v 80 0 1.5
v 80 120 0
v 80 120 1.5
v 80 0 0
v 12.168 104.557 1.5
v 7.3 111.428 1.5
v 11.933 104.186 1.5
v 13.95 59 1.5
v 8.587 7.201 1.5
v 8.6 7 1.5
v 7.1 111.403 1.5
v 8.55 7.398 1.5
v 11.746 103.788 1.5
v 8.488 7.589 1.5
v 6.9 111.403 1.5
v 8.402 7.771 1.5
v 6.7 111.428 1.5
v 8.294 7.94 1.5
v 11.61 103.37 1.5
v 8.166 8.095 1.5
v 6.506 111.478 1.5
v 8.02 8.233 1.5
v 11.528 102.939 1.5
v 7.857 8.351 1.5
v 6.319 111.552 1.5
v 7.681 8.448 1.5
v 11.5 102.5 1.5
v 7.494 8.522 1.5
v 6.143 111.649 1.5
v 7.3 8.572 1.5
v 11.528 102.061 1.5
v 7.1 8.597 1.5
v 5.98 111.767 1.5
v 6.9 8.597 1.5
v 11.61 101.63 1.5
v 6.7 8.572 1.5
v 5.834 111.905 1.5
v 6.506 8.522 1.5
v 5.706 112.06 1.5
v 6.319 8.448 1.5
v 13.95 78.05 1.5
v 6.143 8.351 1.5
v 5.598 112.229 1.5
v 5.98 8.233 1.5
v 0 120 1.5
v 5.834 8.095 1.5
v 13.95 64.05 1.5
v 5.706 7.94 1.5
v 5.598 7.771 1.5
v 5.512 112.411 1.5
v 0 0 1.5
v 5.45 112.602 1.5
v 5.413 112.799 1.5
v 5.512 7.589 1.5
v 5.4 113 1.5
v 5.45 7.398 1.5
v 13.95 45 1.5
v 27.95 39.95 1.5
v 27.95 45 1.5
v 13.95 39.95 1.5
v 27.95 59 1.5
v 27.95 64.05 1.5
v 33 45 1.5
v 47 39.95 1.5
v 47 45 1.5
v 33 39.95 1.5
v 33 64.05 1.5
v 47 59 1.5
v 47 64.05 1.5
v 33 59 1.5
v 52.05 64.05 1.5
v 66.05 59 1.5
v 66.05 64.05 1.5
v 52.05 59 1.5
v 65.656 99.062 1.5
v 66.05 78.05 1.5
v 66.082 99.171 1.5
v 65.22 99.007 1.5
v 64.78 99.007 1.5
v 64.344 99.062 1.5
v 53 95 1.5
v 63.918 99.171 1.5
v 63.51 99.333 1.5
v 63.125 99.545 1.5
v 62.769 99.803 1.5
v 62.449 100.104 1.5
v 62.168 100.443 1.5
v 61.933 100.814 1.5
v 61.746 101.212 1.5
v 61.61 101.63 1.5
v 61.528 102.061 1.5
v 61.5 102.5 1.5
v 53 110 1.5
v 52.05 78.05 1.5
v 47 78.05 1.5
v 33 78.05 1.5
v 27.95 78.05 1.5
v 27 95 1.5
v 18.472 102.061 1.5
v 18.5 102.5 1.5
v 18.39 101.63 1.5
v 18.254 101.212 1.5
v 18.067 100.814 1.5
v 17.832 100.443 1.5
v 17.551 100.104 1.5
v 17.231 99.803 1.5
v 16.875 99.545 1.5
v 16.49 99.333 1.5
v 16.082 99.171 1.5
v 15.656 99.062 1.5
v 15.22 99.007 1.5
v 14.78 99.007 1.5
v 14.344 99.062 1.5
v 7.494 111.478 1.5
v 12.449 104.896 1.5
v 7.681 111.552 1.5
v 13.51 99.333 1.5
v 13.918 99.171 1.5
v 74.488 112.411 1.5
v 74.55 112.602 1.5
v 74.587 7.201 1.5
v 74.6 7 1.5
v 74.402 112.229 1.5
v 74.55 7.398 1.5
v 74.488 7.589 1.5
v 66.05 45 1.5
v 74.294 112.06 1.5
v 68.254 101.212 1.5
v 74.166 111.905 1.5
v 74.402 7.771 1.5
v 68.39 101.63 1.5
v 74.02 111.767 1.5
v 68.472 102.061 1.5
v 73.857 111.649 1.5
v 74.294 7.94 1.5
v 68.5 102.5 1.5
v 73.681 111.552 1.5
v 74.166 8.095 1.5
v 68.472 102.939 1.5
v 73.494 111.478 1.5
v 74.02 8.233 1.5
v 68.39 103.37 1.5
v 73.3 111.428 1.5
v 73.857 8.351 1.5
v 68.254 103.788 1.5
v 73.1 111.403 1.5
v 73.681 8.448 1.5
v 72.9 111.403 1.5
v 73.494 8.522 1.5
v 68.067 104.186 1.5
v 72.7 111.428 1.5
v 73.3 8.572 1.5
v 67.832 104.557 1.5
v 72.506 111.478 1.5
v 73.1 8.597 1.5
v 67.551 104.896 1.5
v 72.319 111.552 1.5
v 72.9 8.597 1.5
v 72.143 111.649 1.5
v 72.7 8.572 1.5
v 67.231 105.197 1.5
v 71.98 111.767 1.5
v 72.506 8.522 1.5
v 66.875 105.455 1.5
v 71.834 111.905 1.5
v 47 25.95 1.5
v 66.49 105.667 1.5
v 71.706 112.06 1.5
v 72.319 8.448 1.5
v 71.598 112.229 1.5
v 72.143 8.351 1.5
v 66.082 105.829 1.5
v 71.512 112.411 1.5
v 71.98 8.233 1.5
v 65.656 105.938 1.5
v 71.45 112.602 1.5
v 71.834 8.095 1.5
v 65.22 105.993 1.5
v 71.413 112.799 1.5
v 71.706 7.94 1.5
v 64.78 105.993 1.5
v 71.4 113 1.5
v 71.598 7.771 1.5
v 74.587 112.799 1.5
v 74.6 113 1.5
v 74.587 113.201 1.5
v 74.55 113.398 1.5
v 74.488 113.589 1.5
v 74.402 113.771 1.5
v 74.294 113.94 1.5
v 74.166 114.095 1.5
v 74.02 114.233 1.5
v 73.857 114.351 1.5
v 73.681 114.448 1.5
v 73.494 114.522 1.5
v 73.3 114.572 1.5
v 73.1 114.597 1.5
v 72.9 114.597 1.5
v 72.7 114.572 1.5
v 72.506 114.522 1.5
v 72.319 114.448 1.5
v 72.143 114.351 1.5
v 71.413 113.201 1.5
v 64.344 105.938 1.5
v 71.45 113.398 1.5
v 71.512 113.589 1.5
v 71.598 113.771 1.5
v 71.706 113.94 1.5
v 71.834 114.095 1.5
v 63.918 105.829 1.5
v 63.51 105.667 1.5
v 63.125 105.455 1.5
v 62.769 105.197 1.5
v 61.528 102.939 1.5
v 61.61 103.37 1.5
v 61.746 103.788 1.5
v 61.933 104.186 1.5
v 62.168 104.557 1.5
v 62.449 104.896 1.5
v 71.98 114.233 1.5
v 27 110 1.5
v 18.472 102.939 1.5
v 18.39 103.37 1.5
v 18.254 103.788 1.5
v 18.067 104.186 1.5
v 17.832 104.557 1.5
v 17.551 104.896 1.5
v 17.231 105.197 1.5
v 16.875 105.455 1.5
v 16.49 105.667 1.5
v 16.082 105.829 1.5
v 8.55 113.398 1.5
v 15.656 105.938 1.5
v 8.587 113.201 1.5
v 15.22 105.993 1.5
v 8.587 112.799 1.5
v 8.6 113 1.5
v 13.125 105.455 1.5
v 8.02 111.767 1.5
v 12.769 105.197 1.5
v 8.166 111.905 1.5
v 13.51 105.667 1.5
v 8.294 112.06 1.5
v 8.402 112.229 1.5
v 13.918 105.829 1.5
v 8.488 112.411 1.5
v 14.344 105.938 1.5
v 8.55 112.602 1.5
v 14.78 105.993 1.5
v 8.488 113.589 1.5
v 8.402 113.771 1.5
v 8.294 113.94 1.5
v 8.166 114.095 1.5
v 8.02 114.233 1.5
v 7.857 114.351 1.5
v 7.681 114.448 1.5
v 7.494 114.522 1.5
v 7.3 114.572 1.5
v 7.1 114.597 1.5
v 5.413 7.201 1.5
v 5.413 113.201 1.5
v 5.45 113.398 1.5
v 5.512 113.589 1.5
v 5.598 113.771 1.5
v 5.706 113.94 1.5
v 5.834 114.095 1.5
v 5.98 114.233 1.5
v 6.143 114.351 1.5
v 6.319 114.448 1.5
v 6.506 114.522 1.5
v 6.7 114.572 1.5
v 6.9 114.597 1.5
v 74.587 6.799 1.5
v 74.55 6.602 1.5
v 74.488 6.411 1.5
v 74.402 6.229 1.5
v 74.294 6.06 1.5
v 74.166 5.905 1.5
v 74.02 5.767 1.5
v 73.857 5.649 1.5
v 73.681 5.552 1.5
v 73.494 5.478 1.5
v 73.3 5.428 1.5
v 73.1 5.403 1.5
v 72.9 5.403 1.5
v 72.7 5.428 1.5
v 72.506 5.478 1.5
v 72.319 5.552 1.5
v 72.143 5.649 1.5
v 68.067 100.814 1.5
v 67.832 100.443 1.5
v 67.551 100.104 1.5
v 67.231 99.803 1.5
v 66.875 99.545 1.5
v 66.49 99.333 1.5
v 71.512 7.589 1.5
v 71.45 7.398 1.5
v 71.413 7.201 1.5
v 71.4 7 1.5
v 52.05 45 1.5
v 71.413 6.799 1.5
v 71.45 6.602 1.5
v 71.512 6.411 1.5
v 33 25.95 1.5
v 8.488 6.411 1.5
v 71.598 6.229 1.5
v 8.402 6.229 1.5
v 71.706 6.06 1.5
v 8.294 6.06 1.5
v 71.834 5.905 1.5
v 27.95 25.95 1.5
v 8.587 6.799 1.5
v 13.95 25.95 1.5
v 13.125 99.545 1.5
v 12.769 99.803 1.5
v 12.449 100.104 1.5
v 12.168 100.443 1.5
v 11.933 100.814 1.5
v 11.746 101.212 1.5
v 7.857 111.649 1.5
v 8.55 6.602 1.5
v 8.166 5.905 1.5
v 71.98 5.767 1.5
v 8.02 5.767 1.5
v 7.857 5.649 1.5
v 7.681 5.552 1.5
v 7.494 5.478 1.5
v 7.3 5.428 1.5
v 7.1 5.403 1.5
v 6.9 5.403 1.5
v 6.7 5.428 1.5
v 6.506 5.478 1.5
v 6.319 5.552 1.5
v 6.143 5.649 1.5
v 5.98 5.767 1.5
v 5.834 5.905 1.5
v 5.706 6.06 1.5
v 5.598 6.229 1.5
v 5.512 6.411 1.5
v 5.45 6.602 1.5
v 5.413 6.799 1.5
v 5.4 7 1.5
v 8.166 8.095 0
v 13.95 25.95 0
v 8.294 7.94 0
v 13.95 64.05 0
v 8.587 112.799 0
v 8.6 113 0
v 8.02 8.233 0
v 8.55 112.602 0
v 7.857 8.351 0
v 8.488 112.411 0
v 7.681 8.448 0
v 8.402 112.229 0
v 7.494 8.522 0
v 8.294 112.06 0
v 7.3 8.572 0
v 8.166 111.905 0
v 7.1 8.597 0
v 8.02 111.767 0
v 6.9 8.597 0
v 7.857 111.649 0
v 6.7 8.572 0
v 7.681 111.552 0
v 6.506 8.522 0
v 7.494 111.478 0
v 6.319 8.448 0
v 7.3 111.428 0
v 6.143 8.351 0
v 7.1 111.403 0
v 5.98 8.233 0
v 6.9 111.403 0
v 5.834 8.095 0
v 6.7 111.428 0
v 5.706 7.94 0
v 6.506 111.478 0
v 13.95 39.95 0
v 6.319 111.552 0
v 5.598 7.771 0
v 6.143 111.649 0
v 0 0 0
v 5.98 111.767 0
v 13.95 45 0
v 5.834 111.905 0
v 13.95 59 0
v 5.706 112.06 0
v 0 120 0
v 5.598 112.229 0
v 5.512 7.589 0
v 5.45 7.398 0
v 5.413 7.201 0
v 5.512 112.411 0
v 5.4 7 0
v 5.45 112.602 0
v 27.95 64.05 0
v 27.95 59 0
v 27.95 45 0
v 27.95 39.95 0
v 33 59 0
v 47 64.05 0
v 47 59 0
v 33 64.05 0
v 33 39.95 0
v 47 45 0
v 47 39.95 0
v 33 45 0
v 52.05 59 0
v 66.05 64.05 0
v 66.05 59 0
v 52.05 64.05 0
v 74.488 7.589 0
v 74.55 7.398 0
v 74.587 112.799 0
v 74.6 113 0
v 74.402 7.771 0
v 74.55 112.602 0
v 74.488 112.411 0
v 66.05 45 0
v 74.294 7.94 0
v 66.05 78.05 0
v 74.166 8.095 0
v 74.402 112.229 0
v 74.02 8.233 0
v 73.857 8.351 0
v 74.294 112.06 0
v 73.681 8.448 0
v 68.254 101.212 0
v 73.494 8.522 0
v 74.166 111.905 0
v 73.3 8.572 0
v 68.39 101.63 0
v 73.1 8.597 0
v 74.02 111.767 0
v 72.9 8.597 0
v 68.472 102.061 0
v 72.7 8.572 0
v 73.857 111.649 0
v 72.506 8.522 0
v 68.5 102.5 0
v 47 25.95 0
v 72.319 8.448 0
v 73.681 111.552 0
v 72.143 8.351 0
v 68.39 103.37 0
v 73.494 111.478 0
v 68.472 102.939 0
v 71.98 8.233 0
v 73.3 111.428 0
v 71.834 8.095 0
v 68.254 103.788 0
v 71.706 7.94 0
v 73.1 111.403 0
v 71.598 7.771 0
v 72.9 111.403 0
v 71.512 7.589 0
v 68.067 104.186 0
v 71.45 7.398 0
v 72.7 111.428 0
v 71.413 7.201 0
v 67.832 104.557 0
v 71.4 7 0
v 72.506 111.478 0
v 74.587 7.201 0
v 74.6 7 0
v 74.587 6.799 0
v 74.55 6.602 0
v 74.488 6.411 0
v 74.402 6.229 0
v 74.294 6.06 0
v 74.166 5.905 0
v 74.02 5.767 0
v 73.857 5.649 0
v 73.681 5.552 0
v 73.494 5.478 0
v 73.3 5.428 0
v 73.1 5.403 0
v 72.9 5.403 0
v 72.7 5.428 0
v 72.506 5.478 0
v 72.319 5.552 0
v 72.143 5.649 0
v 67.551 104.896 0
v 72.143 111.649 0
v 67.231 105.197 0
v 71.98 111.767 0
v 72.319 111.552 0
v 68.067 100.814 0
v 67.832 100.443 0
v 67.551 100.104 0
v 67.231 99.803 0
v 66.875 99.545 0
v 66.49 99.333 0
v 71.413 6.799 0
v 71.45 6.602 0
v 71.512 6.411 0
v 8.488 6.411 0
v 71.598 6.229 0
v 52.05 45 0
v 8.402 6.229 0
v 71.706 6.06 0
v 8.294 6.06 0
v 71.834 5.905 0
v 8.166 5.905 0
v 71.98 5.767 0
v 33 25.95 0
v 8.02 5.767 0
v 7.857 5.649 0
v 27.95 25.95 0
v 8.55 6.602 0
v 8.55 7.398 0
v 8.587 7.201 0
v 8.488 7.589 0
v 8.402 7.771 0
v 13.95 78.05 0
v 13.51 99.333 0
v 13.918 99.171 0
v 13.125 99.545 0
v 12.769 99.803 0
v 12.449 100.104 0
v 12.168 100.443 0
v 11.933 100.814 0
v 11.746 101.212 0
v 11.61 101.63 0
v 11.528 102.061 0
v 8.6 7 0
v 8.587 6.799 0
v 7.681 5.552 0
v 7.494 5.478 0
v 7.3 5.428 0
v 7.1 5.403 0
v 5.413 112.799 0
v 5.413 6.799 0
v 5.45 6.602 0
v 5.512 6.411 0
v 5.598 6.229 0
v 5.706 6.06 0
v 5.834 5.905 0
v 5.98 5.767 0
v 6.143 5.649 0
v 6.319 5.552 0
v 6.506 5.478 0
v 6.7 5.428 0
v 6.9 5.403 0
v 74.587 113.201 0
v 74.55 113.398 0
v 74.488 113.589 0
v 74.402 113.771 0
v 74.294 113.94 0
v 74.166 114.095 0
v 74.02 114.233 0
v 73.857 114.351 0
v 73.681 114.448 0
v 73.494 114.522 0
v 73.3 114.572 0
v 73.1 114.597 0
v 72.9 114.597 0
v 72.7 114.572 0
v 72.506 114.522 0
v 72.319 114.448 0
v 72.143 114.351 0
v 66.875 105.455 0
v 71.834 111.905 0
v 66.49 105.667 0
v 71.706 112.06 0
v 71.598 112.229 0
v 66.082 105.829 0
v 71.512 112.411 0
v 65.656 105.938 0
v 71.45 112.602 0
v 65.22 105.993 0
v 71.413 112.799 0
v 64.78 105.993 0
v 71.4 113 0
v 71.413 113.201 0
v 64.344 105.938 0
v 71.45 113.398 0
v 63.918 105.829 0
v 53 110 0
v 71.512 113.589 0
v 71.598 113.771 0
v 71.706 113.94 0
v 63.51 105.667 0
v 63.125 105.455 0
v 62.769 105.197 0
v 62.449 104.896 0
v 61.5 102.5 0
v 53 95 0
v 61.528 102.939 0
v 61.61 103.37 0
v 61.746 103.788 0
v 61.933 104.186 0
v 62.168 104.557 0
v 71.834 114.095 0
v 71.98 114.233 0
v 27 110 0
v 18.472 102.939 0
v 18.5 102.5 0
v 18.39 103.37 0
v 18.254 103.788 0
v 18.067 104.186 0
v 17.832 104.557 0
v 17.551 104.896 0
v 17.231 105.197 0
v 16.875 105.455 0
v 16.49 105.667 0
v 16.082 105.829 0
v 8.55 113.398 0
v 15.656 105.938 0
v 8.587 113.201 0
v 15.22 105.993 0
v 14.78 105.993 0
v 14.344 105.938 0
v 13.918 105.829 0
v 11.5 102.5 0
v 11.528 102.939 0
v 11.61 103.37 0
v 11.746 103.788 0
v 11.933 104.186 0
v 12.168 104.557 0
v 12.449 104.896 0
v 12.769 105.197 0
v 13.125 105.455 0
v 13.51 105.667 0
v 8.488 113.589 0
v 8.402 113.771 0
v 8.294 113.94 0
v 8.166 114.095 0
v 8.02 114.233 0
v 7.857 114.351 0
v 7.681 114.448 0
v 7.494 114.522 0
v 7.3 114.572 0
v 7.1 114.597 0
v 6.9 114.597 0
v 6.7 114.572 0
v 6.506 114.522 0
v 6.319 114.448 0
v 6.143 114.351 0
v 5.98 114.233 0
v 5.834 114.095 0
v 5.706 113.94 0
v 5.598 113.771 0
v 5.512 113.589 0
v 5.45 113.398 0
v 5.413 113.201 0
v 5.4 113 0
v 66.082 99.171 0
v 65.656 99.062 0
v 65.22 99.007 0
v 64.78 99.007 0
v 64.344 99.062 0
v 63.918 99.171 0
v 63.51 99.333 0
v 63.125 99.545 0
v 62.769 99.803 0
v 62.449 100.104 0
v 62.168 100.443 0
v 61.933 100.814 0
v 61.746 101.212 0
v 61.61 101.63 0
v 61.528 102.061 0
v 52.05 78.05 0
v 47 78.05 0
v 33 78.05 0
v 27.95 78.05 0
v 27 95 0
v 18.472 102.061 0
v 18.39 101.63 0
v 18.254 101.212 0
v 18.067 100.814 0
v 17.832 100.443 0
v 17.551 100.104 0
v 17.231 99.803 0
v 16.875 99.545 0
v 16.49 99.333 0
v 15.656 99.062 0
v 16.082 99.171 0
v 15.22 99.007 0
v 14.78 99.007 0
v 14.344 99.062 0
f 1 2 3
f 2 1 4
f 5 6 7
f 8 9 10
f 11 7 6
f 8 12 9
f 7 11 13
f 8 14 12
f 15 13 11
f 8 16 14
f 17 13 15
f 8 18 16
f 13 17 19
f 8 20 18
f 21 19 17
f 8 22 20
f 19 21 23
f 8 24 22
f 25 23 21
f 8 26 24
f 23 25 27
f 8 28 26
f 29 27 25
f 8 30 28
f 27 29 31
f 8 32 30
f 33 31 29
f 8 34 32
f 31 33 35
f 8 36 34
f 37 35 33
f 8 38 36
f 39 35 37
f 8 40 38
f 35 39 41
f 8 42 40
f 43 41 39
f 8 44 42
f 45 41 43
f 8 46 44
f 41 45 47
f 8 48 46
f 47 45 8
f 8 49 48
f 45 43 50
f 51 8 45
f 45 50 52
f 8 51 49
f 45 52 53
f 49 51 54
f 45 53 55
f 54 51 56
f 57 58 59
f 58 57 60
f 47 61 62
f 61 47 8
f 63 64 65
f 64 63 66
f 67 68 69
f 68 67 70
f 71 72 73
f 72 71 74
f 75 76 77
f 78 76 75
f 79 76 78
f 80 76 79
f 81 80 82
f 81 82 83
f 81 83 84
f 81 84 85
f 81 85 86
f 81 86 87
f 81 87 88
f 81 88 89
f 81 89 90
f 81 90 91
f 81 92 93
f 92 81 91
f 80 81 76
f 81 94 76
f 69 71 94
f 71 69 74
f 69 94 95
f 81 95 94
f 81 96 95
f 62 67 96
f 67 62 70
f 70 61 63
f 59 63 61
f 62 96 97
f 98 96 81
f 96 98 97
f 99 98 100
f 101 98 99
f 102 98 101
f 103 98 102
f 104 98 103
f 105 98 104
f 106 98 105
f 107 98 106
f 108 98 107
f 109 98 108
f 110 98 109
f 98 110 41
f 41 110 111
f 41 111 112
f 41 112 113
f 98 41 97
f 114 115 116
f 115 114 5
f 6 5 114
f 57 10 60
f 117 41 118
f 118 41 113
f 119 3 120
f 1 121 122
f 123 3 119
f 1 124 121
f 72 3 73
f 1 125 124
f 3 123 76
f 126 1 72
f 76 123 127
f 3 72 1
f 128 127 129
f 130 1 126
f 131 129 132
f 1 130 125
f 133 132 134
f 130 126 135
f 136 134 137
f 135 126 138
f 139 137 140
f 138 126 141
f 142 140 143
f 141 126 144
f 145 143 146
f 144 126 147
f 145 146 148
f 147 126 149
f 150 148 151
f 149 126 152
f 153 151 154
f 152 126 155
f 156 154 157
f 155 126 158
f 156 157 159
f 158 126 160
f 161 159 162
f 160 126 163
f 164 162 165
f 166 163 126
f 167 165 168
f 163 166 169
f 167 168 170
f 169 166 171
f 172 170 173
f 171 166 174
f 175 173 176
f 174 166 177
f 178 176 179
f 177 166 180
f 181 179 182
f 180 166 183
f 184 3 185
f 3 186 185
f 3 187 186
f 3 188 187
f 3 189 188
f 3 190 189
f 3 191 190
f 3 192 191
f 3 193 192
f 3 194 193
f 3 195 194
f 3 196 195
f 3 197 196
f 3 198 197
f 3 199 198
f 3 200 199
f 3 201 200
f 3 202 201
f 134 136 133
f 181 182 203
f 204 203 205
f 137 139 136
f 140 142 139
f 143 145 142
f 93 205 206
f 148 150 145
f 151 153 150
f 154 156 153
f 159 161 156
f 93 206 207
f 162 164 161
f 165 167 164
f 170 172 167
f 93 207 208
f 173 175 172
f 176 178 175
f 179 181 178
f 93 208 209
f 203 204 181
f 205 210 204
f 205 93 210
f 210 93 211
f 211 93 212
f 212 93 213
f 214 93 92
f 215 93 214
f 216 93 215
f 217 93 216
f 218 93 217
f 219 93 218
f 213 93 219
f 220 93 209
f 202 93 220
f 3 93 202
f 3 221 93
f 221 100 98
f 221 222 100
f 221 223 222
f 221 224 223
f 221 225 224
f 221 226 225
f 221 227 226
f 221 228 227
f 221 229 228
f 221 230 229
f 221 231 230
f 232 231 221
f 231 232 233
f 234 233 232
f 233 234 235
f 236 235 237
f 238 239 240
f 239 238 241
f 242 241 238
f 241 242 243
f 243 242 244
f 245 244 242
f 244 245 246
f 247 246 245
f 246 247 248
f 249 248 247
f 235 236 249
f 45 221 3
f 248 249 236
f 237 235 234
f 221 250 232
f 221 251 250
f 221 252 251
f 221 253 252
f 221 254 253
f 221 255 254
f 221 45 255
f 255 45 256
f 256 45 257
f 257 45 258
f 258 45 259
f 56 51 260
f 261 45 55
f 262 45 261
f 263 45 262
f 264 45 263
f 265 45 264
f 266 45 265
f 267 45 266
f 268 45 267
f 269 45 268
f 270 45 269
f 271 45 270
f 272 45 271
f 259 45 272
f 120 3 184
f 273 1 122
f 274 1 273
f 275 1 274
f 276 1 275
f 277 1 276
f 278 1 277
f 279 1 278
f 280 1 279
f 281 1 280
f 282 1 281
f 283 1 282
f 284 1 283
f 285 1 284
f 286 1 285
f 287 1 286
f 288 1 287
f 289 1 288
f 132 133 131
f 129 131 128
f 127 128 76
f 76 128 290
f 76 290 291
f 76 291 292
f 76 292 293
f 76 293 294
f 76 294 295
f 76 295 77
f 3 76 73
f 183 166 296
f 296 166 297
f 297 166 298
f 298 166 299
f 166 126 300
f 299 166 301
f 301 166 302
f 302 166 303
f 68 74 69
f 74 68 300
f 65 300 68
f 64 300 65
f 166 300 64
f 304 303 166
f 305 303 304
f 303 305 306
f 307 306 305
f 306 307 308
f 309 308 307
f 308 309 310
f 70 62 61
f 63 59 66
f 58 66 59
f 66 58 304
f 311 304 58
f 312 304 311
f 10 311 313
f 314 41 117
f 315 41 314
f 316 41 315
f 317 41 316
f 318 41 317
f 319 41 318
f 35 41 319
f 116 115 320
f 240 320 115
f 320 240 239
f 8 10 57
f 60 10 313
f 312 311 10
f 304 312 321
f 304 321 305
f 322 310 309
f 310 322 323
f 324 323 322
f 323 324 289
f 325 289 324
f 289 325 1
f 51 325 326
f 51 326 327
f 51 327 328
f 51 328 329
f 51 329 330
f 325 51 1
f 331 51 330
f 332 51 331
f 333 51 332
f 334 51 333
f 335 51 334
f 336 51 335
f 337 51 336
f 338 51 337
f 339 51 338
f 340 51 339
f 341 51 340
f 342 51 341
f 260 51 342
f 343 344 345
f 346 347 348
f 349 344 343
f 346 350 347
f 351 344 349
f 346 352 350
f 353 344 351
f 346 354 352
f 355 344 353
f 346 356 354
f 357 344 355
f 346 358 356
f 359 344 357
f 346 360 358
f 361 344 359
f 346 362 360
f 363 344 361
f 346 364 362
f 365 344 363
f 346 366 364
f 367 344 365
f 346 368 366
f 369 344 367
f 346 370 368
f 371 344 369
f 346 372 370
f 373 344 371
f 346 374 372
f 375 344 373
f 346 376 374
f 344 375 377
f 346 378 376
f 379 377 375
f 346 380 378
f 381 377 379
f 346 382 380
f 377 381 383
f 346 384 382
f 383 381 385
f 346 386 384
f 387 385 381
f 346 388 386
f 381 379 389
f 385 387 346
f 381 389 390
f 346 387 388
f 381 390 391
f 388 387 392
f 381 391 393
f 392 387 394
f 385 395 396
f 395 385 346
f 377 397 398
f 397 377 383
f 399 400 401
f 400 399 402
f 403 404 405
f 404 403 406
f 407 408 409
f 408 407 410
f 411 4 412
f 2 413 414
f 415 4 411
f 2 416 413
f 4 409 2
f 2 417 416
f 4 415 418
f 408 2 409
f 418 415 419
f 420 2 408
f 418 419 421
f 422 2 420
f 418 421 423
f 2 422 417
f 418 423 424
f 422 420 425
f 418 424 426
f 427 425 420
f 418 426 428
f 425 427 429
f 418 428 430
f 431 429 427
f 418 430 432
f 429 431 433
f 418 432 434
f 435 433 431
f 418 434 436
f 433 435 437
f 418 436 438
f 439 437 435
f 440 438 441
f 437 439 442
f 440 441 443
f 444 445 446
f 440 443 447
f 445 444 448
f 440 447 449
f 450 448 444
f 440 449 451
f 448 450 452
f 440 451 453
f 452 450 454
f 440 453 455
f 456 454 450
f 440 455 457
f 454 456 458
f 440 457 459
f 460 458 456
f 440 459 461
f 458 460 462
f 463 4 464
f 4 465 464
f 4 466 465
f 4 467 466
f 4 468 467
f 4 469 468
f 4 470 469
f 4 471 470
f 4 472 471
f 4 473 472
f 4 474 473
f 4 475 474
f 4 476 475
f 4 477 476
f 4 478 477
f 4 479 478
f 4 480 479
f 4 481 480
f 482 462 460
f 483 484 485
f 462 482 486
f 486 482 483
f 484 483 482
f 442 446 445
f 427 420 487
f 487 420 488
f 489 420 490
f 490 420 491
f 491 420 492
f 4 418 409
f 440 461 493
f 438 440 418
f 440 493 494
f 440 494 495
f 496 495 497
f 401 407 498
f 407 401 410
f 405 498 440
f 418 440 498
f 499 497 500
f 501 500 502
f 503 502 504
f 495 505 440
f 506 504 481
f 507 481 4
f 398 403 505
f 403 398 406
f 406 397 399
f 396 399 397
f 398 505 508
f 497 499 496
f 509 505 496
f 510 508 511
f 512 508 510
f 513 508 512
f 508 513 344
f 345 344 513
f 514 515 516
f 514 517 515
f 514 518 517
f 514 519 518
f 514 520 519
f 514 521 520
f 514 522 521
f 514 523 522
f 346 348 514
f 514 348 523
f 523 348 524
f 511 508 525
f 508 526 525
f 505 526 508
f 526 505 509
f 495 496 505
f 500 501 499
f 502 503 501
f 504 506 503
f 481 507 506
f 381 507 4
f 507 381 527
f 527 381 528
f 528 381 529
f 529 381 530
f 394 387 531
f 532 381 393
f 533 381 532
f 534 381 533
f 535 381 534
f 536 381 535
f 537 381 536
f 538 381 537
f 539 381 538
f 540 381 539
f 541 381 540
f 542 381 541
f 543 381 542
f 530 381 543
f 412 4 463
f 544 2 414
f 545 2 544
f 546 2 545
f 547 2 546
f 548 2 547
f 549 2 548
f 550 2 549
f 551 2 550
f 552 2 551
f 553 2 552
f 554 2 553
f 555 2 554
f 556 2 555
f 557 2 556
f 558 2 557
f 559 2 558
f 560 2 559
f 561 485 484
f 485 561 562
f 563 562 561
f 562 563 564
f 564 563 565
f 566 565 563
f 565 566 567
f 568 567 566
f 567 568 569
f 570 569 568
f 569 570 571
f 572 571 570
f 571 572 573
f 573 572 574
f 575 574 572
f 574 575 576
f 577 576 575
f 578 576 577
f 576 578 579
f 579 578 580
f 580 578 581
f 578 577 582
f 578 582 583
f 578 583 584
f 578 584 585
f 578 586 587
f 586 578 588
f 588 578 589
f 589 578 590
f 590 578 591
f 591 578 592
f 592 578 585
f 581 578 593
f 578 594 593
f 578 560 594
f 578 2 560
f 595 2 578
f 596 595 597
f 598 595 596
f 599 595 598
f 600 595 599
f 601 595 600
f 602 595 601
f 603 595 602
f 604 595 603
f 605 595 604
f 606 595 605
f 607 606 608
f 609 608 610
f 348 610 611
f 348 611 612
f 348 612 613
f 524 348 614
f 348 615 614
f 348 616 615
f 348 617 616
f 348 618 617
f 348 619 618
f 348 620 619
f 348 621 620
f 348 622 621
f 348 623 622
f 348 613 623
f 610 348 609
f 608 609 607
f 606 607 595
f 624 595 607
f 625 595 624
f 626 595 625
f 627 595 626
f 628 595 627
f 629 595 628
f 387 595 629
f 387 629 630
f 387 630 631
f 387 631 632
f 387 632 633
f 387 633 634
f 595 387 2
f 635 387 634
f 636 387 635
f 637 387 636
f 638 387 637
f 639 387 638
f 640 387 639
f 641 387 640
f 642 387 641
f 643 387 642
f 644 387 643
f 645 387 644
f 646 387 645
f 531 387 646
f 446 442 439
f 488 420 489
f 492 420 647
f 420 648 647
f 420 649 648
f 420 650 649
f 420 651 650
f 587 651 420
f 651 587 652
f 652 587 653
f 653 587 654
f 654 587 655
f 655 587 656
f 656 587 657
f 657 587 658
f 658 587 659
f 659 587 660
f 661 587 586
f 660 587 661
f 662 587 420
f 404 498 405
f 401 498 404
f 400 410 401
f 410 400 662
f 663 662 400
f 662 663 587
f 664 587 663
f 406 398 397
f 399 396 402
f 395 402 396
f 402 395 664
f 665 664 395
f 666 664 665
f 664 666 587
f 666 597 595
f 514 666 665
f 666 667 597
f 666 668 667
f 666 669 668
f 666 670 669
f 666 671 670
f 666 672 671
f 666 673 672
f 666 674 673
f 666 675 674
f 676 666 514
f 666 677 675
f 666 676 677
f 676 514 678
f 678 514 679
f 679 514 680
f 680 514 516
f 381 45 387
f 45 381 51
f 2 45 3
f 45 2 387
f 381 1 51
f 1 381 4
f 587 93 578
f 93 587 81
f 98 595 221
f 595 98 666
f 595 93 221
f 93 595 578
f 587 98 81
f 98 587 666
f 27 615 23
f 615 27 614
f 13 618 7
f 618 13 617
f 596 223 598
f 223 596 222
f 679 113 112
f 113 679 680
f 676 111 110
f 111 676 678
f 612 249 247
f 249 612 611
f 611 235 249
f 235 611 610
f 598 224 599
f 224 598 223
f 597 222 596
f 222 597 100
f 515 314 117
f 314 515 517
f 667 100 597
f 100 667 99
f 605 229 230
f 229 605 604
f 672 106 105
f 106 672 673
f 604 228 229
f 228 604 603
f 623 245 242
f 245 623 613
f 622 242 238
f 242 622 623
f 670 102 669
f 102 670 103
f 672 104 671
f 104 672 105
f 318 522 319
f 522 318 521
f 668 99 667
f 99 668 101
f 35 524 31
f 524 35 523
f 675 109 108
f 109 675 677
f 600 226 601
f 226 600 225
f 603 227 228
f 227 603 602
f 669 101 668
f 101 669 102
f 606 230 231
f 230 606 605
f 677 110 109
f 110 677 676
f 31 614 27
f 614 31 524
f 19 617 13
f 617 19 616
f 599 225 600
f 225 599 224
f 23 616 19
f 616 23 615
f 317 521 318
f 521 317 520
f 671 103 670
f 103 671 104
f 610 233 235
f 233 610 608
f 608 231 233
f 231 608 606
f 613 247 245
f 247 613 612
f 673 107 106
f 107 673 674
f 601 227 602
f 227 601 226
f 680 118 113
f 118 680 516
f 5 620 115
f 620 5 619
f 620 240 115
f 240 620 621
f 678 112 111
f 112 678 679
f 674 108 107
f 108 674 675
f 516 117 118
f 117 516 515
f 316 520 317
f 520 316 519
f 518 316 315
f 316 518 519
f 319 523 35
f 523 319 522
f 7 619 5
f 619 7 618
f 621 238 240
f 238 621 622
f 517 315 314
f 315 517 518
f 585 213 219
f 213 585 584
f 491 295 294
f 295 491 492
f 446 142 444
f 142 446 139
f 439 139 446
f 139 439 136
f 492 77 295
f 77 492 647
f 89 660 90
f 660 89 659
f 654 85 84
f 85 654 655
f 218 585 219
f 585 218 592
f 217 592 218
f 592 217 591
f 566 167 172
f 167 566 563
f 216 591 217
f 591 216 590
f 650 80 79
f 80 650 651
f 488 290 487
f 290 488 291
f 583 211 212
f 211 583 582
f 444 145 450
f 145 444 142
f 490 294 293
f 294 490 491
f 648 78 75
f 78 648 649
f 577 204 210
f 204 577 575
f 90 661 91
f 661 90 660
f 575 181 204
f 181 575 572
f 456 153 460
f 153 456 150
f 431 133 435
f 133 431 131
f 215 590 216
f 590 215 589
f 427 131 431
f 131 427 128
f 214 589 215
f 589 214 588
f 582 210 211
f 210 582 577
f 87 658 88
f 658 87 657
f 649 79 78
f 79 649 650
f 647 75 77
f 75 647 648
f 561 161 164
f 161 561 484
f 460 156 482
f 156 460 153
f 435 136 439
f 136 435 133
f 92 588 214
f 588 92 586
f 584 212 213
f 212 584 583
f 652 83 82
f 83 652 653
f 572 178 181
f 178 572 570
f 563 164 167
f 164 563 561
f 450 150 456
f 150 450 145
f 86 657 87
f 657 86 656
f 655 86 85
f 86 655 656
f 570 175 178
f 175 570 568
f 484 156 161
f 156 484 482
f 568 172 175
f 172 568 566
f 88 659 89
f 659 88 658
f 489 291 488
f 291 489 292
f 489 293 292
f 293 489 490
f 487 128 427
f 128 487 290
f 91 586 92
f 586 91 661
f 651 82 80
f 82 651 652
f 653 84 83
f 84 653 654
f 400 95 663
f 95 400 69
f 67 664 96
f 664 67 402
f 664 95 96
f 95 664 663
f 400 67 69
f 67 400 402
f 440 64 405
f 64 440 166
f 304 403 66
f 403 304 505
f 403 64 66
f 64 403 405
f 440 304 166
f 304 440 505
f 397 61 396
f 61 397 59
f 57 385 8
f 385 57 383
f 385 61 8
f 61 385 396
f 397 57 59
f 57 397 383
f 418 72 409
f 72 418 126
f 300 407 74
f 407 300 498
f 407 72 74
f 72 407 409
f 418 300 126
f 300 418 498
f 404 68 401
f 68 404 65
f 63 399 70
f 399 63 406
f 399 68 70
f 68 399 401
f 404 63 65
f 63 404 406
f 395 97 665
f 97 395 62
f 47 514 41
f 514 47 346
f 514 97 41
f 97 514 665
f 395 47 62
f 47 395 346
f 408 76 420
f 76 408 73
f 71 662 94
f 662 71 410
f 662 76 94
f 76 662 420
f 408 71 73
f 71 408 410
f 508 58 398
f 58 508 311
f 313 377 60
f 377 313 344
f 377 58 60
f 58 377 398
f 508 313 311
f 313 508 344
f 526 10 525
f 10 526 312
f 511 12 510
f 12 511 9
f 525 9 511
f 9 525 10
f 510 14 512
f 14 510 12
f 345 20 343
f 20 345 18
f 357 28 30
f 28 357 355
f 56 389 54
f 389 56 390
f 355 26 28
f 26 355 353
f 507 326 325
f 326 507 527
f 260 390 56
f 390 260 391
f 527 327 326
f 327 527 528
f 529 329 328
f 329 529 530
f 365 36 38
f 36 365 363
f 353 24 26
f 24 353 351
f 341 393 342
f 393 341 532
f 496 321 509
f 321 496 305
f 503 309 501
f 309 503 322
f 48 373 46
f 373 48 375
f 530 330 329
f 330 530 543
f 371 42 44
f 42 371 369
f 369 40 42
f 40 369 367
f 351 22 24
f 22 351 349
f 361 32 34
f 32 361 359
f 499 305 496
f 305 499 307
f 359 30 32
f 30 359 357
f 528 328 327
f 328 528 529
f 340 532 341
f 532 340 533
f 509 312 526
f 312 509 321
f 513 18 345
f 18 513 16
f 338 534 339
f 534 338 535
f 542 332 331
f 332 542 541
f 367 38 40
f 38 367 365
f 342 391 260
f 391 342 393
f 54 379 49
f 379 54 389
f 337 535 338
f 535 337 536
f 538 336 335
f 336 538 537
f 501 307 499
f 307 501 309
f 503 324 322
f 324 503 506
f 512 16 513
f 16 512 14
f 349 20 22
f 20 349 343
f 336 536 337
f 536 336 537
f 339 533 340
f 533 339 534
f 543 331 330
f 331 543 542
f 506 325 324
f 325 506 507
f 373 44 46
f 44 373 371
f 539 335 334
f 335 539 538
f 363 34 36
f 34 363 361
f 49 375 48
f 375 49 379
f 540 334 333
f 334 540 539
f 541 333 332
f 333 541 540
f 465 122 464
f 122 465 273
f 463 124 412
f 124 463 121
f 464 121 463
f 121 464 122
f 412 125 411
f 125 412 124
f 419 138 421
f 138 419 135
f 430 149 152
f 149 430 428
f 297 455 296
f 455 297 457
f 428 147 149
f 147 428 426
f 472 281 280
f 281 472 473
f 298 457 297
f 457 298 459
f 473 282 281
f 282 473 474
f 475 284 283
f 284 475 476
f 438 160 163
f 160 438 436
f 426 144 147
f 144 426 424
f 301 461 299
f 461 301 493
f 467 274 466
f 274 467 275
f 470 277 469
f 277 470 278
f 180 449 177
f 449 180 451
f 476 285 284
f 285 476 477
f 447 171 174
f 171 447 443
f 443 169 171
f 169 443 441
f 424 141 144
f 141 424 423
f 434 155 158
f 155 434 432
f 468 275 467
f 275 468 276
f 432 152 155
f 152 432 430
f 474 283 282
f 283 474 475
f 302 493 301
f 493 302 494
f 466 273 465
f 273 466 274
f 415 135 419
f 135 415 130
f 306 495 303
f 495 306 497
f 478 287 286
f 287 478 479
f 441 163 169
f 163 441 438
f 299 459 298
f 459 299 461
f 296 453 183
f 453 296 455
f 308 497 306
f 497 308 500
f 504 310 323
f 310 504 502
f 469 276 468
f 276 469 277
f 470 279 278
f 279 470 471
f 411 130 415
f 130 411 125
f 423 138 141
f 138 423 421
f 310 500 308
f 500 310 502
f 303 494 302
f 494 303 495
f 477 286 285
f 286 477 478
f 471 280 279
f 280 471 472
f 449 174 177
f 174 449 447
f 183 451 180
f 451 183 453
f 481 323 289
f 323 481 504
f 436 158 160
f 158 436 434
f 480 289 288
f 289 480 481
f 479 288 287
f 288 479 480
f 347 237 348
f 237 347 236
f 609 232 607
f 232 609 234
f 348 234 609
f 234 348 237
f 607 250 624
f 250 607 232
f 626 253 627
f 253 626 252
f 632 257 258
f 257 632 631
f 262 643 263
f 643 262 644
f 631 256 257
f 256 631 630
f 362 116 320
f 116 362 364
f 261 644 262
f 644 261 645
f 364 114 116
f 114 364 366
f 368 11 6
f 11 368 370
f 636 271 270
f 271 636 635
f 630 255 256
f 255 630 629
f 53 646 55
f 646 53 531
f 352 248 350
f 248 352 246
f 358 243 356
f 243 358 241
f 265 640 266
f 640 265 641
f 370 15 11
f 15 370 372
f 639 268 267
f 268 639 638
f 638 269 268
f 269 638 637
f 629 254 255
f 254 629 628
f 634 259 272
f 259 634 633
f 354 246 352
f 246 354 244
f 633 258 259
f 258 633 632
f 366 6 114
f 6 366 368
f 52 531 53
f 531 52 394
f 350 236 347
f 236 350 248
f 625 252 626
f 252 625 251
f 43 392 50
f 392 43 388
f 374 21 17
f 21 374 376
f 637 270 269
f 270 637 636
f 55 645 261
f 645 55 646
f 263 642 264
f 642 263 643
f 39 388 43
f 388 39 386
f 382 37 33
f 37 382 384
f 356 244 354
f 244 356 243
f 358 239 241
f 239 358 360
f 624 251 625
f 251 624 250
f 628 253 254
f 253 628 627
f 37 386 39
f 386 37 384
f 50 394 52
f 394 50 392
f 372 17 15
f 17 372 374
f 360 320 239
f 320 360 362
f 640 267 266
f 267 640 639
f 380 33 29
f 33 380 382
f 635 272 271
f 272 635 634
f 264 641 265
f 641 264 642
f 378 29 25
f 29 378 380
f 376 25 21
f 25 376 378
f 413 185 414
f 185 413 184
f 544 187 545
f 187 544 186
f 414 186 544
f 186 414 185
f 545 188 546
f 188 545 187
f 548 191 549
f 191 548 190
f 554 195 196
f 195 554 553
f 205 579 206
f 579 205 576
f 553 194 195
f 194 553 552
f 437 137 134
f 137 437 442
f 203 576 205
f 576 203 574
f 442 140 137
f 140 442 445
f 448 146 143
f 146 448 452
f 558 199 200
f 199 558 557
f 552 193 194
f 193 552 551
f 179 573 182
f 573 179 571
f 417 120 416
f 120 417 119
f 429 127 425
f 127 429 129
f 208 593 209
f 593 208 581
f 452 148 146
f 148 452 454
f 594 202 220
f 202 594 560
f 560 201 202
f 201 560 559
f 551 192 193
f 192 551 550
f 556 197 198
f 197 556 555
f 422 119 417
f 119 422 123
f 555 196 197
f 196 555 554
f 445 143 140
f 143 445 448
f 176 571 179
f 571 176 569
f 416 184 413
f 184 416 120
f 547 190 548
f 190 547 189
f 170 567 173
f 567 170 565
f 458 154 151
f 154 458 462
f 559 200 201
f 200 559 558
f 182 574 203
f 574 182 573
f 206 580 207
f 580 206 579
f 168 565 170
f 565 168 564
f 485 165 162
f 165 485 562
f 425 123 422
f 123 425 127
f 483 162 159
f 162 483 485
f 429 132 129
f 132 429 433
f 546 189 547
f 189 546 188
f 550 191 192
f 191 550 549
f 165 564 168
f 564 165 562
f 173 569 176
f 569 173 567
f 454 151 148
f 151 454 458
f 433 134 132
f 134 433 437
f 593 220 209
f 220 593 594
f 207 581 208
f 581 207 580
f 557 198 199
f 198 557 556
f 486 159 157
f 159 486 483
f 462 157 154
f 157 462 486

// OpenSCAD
// --- TACTICAL HACKPAD TOP PLATE ---
// Dimensions exactly match 1.5mm mechanical requirements

$fn = 50; // Smooths out the circular holes

plate_width = 80;
plate_height = 120;
thickness = 1.5;

switch_size = 14; 
encoder_radius = 3.5; // 7mm diameter
oled_w = 26;
oled_h = 15;

difference() {
    // 1. The Main Base Plate
    cube([plate_width, plate_height, thickness]);

    // 2. --- TOP SECTION (OLED & Encoders) ---
    // OLED (Center Top)
    translate([plate_width/2 - oled_w/2, plate_height - 25, -1])
        cube([oled_w, oled_h, thickness + 2]);

    // Speed Encoder (Left)
    translate([15, plate_height - 17.5, -1])
        cylinder(h=thickness+2, r=encoder_radius);

    // Scroll Encoder (Right)
    translate([plate_width - 15, plate_height - 17.5, -1])
        cylinder(h=thickness+2, r=encoder_radius);

    // 3. --- BUTTON MATRIX SECTION ---
    cx = plate_width / 2 - switch_size / 2;
    cy = 45;
    spacing = 19.05; // Standard Cherry MX keycap spacing

    // Center Cross
    translate([cx, cy + spacing, -1]) cube([switch_size, switch_size, thickness + 2]); // Up
    translate([cx, cy - spacing, -1]) cube([switch_size, switch_size, thickness + 2]); // Down
    translate([cx - spacing, cy, -1]) cube([switch_size, switch_size, thickness + 2]); // Left
    translate([cx + spacing, cy, -1]) cube([switch_size, switch_size, thickness + 2]); // Right
    translate([cx, cy, -1]) cube([switch_size, switch_size, thickness + 2]); // Single Click (Center)

    // Outer Buttons
    translate([cx - spacing, cy + spacing, -1]) cube([switch_size, switch_size, thickness + 2]); // Double Click (Top Left)
    translate([cx + spacing, cy + spacing, -1]) cube([switch_size, switch_size, thickness + 2]); // Left Click (Top Right)
    translate([cx - spacing, cy - spacing, -1]) cube([switch_size, switch_size, thickness + 2]); // Select (Bottom Left)

    // 4. --- MOUNTING HOLES ---
    // 3.2mm holes to pass the M3 screws through to the chassis
    translate([7, 7, -1]) cylinder(h=thickness+2, d=3.2);
    translate([plate_width - 7, 7, -1]) cylinder(h=thickness+2, d=3.2);
    translate([7, plate_height - 7, -1]) cylinder(h=thickness+2, d=3.2);
    translate([plate_width - 7, plate_height - 7, -1]) cylinder(h=thickness+2, d=3.2);
}
